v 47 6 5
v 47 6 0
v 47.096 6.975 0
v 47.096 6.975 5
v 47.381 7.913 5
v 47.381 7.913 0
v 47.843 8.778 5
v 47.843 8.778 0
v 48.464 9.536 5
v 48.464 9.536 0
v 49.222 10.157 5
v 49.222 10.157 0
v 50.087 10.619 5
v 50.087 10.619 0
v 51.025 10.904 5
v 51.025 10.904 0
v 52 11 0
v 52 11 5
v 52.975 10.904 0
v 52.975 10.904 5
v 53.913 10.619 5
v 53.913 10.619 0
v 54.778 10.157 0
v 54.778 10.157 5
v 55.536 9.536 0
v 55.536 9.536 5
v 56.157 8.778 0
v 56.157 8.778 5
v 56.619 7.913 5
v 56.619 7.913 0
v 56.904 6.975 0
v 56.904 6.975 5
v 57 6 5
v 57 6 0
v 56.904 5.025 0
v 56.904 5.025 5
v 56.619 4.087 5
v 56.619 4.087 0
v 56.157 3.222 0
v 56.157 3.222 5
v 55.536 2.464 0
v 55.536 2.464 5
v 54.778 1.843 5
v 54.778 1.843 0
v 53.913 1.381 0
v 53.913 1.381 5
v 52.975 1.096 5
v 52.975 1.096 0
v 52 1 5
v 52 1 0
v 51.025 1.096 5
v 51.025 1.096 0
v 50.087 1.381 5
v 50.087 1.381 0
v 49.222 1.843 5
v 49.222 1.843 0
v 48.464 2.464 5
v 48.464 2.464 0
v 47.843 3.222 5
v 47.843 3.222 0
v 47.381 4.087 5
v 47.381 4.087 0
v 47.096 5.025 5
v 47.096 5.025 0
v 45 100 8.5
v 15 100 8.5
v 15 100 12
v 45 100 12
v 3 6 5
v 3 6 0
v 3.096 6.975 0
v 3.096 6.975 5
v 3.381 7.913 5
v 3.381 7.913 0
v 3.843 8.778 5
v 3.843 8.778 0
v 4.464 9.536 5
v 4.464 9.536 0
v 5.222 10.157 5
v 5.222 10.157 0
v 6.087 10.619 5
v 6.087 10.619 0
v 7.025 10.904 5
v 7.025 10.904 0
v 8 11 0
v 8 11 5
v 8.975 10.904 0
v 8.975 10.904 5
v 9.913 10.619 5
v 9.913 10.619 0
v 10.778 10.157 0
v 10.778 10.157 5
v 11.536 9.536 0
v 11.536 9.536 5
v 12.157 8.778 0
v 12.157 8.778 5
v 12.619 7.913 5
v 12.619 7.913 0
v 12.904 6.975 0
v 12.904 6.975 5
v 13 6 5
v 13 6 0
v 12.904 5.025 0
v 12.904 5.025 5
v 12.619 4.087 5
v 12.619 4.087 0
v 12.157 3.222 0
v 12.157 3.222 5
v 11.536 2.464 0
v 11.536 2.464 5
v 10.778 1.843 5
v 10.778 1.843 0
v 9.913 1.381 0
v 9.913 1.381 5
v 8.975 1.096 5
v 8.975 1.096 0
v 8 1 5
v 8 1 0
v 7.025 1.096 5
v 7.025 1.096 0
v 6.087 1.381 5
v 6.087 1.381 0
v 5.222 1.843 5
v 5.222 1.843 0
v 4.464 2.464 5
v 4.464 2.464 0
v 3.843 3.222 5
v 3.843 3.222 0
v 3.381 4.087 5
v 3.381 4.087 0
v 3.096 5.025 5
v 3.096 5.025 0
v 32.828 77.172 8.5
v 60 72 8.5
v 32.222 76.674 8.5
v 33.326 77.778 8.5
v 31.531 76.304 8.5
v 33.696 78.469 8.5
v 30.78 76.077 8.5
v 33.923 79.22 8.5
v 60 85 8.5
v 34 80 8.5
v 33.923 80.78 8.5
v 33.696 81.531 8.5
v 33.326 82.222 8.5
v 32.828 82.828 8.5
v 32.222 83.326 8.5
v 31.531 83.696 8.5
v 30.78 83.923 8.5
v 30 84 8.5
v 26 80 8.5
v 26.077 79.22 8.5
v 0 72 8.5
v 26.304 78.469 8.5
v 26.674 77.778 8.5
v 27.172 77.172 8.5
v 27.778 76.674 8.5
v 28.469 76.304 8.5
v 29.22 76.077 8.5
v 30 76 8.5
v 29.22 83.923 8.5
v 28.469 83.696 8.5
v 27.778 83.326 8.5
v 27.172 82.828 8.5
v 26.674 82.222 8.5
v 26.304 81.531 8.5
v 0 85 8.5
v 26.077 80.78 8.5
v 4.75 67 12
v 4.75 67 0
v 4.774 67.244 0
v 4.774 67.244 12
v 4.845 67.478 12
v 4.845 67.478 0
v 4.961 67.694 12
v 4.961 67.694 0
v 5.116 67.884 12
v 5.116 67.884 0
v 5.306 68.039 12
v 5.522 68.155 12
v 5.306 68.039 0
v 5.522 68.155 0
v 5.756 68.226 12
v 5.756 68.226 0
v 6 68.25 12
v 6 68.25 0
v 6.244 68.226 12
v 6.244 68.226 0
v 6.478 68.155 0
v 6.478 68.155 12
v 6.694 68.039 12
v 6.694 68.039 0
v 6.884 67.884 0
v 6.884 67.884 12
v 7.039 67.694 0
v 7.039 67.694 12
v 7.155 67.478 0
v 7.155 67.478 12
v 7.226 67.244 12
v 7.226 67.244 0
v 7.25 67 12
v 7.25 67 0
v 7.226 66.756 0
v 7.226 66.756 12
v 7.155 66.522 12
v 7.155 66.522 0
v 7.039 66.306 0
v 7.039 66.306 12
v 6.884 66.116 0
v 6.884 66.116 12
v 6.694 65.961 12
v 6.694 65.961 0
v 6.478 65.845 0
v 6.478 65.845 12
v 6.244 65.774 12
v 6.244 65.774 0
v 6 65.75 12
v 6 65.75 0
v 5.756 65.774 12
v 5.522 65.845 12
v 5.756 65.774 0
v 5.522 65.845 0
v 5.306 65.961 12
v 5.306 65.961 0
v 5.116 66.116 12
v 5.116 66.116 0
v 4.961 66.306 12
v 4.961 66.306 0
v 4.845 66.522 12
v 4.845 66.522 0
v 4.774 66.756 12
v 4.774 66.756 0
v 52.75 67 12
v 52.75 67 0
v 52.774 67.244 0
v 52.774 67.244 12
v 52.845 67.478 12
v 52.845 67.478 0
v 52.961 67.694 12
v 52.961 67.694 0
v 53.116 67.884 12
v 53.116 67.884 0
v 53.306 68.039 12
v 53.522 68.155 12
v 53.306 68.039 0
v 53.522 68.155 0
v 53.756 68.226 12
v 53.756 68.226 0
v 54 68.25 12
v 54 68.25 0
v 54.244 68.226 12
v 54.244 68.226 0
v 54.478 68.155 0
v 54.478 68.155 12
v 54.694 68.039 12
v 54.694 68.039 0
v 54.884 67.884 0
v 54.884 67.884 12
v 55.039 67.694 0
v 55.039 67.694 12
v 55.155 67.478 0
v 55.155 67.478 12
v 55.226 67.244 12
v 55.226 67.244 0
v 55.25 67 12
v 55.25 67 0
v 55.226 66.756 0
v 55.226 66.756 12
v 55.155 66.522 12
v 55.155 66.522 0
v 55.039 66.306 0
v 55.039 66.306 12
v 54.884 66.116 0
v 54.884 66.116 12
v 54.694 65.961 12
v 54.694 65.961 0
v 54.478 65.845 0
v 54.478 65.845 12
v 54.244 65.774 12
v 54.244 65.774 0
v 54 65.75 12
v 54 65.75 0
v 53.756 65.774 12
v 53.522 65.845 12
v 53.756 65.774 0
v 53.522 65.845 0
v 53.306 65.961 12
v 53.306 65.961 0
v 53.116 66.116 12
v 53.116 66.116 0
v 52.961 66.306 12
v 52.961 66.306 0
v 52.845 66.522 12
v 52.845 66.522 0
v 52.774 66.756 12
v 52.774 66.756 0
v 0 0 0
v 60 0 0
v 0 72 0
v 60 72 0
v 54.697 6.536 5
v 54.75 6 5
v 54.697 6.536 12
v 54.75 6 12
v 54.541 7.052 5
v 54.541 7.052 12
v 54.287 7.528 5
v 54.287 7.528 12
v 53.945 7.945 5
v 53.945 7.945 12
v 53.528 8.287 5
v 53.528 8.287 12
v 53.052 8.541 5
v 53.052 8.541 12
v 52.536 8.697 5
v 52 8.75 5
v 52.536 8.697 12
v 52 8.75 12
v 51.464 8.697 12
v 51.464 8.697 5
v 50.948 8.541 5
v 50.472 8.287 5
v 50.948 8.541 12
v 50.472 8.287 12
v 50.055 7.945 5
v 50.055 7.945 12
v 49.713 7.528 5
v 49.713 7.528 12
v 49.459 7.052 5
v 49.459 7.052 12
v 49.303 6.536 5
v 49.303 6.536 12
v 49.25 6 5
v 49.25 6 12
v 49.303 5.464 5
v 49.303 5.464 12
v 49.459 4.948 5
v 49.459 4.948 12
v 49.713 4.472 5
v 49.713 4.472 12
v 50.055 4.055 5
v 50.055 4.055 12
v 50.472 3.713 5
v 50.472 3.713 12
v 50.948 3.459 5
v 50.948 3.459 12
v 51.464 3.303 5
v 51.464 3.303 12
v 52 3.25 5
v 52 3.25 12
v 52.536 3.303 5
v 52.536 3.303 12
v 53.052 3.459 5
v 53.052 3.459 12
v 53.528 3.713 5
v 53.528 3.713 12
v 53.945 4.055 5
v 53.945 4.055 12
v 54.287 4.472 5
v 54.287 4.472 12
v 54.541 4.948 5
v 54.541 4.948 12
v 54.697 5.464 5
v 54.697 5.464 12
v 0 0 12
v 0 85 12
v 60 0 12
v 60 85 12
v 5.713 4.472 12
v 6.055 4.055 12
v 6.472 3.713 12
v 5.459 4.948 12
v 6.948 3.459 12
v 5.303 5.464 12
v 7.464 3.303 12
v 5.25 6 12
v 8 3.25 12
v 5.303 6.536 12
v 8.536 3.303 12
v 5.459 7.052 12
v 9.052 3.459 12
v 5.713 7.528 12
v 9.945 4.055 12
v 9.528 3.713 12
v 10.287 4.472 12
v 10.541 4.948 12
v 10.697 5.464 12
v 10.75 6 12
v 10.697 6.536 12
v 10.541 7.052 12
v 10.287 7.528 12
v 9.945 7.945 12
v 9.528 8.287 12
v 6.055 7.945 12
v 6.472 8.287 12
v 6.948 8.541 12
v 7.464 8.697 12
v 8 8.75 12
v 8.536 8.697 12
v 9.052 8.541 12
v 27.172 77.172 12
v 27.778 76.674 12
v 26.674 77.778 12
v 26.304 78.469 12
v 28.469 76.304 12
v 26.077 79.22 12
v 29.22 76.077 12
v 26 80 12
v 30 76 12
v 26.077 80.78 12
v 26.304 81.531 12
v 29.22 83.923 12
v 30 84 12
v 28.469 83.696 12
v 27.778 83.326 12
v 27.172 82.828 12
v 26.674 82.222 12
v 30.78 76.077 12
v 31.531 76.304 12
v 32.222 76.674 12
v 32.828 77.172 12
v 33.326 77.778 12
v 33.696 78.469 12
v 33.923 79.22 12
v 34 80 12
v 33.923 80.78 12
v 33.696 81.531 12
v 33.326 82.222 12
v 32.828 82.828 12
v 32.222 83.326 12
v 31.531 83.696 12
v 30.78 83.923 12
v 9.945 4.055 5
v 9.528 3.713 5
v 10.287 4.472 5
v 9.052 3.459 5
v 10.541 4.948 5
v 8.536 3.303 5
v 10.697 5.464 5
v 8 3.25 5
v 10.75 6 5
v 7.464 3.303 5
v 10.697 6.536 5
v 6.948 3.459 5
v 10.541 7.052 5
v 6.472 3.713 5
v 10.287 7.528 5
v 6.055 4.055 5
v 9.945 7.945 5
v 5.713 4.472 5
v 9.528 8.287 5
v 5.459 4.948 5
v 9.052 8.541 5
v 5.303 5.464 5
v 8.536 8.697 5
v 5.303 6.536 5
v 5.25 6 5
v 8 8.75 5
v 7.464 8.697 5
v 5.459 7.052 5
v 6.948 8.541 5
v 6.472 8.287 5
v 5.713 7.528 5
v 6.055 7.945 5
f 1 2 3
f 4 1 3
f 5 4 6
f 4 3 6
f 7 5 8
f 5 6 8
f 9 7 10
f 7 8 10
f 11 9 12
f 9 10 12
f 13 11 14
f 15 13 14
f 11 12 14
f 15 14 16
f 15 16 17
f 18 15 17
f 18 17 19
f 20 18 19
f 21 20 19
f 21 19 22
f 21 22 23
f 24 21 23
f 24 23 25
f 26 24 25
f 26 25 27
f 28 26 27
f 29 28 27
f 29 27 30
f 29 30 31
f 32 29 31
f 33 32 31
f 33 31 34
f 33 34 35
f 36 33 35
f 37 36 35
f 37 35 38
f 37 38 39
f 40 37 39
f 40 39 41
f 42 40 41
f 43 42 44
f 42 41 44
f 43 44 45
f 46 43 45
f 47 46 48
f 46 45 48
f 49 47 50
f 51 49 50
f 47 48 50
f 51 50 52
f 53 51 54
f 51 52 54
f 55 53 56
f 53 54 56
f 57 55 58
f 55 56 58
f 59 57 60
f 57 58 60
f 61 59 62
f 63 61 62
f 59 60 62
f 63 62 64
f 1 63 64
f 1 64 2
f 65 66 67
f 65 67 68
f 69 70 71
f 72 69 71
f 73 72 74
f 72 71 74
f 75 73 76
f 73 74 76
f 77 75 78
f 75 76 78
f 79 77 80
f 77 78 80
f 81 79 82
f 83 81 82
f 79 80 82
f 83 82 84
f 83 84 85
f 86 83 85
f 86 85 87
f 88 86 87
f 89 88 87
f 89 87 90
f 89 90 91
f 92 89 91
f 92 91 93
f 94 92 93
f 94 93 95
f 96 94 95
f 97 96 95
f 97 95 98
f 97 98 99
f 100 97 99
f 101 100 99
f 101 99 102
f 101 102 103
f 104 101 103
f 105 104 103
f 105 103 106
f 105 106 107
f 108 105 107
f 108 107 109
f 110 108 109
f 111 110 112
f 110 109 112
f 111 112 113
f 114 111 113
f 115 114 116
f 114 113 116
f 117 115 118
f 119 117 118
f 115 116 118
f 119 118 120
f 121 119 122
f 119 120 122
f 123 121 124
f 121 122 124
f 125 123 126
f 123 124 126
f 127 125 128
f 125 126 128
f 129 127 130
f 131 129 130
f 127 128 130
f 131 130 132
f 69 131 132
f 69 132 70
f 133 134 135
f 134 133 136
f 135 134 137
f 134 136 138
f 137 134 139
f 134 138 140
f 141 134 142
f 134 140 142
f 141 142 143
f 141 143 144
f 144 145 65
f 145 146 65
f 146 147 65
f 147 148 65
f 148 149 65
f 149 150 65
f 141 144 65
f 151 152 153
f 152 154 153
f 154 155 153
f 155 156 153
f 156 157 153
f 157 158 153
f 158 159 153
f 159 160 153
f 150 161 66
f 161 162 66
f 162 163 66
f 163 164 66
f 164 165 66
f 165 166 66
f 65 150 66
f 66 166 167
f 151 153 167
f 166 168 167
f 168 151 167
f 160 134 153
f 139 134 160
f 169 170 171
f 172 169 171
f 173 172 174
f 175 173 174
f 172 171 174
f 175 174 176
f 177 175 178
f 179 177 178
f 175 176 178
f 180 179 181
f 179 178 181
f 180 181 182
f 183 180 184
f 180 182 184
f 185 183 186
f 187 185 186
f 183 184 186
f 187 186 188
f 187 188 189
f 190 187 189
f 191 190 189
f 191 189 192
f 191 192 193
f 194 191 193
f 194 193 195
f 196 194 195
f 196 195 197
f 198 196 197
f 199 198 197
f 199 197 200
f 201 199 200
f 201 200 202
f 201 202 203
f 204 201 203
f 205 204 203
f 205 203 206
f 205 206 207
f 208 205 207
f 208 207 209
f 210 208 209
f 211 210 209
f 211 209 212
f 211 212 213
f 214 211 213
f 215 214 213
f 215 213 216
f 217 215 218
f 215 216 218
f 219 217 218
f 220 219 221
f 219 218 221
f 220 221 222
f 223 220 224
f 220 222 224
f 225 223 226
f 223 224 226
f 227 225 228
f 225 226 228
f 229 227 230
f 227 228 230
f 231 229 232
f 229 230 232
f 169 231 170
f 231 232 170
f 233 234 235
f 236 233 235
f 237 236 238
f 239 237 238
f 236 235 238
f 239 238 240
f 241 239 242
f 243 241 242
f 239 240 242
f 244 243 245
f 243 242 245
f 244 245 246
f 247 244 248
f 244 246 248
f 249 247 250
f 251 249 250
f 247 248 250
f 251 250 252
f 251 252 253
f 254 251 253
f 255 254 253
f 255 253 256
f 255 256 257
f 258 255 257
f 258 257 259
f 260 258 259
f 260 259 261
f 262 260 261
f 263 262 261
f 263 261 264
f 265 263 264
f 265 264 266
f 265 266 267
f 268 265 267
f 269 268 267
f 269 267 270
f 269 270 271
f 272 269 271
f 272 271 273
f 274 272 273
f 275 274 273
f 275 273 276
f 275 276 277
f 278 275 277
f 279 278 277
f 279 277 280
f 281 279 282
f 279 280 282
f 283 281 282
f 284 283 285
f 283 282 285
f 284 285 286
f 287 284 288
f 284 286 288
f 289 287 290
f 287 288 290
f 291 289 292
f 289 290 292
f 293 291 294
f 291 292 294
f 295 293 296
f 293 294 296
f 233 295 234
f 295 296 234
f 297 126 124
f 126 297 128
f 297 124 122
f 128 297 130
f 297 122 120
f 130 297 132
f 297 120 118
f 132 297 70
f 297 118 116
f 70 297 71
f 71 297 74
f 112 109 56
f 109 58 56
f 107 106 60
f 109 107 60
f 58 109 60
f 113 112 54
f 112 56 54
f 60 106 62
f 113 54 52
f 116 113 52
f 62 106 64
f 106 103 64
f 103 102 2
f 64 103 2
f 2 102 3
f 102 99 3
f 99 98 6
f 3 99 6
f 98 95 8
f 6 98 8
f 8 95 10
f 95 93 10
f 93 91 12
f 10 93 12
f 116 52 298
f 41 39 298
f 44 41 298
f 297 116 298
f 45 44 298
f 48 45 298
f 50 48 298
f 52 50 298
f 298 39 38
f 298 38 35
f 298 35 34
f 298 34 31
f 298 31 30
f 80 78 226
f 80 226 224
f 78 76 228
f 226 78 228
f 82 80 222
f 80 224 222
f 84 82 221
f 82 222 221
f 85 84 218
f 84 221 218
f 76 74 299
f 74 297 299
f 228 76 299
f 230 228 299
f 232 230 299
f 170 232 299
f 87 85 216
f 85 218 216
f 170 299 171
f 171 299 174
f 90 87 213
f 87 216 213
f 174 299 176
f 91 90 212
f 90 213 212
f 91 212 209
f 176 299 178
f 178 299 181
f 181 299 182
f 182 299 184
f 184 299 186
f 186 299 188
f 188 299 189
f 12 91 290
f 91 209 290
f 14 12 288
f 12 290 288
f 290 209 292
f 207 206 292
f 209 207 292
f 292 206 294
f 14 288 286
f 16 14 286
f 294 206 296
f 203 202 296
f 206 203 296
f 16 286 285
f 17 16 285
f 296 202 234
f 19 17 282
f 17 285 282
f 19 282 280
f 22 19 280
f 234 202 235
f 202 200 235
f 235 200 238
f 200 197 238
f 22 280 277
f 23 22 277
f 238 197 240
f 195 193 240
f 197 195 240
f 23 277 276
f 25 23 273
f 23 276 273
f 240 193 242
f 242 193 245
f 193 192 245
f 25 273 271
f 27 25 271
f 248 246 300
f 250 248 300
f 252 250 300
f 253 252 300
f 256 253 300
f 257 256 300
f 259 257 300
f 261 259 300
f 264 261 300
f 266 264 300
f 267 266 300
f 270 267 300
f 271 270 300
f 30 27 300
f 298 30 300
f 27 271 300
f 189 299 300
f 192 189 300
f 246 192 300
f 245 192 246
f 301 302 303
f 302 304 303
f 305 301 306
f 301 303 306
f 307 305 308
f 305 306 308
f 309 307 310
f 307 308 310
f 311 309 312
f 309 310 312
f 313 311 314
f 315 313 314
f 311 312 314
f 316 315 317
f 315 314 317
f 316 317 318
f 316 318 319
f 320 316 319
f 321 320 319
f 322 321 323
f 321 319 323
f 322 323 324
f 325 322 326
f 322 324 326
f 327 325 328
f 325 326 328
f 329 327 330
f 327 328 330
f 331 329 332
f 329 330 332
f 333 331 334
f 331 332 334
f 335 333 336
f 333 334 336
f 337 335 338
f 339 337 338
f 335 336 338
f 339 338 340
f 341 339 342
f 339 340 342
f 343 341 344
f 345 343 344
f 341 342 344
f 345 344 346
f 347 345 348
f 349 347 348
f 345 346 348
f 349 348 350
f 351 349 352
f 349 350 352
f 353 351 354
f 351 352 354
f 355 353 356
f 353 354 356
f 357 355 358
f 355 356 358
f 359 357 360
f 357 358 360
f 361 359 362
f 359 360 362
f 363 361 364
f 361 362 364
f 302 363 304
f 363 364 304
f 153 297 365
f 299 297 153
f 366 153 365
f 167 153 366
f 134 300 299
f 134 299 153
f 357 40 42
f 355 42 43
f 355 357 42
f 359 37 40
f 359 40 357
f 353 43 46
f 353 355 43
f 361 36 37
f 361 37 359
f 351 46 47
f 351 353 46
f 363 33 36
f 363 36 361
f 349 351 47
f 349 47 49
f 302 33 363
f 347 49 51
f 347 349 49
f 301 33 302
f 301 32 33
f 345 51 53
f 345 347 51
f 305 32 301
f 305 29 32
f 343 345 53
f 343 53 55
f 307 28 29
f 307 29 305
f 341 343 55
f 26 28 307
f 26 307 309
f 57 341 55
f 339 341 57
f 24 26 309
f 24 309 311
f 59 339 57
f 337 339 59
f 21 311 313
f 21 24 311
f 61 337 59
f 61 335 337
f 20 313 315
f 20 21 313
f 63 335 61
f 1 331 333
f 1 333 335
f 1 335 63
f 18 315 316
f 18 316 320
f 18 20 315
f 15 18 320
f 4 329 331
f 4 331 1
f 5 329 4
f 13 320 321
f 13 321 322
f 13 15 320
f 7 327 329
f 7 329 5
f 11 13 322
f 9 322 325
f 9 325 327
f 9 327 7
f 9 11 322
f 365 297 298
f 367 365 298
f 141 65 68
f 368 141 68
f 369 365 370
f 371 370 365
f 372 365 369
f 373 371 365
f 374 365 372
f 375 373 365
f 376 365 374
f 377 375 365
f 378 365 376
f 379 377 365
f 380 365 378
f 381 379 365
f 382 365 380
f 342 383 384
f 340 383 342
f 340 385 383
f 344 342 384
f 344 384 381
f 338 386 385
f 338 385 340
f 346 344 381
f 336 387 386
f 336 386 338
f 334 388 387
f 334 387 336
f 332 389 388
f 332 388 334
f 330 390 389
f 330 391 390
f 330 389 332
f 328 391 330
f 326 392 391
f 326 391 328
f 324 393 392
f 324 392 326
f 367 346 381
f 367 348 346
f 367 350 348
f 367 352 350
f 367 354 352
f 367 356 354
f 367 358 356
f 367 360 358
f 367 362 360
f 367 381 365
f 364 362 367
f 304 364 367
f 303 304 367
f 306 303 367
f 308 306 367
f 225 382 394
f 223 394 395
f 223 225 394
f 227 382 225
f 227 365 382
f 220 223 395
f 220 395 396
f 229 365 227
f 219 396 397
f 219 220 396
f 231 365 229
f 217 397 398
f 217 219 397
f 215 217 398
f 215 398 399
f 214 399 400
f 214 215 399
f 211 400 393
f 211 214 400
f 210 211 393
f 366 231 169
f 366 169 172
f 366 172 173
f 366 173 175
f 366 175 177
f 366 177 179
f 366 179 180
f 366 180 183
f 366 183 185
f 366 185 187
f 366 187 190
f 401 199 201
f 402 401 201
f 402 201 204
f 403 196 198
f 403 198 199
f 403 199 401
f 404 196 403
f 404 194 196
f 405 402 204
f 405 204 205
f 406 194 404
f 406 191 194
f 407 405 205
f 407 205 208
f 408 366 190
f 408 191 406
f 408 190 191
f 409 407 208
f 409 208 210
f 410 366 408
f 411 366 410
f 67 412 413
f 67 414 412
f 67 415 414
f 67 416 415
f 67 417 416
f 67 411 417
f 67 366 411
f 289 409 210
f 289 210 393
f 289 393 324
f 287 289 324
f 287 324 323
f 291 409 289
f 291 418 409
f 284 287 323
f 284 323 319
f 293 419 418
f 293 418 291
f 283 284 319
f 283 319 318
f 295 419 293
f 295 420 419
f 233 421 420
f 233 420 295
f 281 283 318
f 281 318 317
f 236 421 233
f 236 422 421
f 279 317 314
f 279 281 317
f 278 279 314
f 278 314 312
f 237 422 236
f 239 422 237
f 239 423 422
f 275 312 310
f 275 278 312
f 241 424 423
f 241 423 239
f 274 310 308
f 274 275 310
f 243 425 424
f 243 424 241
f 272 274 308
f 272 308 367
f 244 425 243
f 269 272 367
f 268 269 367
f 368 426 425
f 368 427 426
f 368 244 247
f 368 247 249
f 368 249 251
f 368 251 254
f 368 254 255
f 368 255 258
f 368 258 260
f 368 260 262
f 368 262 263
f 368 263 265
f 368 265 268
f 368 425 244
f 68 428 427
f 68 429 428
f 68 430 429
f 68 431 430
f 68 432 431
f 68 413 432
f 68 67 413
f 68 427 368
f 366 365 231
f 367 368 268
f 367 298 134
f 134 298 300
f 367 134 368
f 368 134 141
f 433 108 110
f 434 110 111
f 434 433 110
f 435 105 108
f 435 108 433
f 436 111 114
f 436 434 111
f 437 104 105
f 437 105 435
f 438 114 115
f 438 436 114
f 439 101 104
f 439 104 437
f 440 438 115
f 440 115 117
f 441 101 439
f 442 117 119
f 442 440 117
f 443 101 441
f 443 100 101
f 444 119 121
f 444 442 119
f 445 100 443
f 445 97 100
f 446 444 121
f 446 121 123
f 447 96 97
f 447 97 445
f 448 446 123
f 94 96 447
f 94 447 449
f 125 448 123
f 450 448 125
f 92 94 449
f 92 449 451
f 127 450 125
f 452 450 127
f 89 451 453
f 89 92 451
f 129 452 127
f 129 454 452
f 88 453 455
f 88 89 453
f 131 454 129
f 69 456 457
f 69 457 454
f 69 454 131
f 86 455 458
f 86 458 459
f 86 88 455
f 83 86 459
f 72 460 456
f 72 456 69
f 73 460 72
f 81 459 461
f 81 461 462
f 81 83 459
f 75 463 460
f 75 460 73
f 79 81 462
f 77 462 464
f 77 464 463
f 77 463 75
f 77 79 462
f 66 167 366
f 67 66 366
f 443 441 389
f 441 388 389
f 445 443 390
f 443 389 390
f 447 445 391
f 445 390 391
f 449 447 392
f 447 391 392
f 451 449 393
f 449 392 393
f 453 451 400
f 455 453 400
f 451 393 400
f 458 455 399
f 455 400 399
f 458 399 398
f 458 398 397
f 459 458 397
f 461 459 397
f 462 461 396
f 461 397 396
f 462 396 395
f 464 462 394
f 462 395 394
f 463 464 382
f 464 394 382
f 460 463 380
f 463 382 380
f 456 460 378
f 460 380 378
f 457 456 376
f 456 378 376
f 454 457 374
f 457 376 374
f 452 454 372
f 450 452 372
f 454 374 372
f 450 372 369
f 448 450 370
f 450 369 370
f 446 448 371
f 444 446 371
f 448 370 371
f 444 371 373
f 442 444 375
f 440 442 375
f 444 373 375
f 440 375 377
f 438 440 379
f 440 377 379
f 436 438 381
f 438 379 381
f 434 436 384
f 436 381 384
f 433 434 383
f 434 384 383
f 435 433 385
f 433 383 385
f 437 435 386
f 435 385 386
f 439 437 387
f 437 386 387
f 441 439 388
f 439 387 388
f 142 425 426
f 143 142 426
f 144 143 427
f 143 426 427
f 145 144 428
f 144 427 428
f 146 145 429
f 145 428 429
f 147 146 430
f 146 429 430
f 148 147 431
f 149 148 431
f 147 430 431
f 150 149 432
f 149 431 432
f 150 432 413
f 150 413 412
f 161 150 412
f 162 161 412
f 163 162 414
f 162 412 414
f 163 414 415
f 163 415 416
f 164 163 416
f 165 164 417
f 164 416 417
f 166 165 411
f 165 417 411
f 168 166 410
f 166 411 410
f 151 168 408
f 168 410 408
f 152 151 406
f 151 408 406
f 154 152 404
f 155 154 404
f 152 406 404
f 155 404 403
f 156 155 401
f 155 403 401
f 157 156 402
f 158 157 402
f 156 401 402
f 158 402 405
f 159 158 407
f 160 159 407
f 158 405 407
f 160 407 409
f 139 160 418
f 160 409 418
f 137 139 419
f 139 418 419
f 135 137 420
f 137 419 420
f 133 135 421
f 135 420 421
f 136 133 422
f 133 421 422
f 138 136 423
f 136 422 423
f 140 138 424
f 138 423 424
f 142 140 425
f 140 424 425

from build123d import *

# Parameters (mm, degrees)
ESQUISSE2_W                                        = 60
ESQUISSE2_H                                        = 100
BOSS_EXTRU_1_DEPTH                                 = 12
ESQUISSE3_R                                        = 4
ENL_V_MAT_EXTRU_1_DEPTH                            = 3.5
ESQUISSE5_W                                        = 8.5
ESQUISSE5_H                                        = 28
ENL_V_MAT_EXTRU_2_DEPTH                            = 61
TROU_TARAUD_M31_D                                  = 2.5
TROU_TARAUD_M32_D                                  = 2.5
CHAMBRAGE_POUR_VIS_T_TE_HEXAGONALE_M51_D           = 5.5
CHAMBRAGE_POUR_VIS_T_TE_HEXAGONALE_M51_CBORE_D     = 10
CHAMBRAGE_POUR_VIS_T_TE_HEXAGONALE_M51_CBORE_DEPTH = 5
CHAMBRAGE_POUR_VIS_T_TE_HEXAGONALE_M52_D           = 5.5
CHAMBRAGE_POUR_VIS_T_TE_HEXAGONALE_M52_CBORE_D     = 10
CHAMBRAGE_POUR_VIS_T_TE_HEXAGONALE_M52_CBORE_DEPTH = 5
CHANFREIN1_SIZE                                    = 15


with BuildPart() as part:
    # Esquisse2 → Boss.-Extru.1 (new body)
    with BuildSketch(Plane.XY):
        with Locations((30, 50)):
            Rectangle(ESQUISSE2_W, ESQUISSE2_H)
    extrude(amount=BOSS_EXTRU_1_DEPTH)

    # Esquisse3 → Enlèv. mat.-Extru.1 (cut)
    with BuildSketch(Plane.XY.offset(12)):
        with Locations((30, 80)):
            Circle(ESQUISSE3_R)
    extrude(amount=-ENL_V_MAT_EXTRU_1_DEPTH, mode=Mode.SUBTRACT)

    # Esquisse5 → Enlèv. mat.-Extru.2 (cut, through all)
    with BuildSketch(Plane.ZY):
        with Locations((4.25, 86)):
            Rectangle(ESQUISSE5_W, ESQUISSE5_H)
    extrude(amount=-ENL_V_MAT_EXTRU_2_DEPTH, mode=Mode.SUBTRACT)

    # Trou taraudé M31 (through all)
    with Locations(Plane.XY.offset(12)):
        with Locations((54, 67), (30, 80)):
            Hole(TROU_TARAUD_M31_D / 2)

    # Trou taraudé M32 (through all)
    with Locations(Plane.XY.offset(12)):
        with Locations((6, 67)):
            Hole(TROU_TARAUD_M32_D / 2)

    # Chambrage pour vis à tête hexagonale M51 (through all)
    with Locations(Plane(origin=(0, 0, 0), x_dir=(-1, 0, 0), z_dir=(0, 0, -1))):
        with Locations((-8, 6)):
            CounterBoreHole(CHAMBRAGE_POUR_VIS_T_TE_HEXAGONALE_M51_D / 2, CHAMBRAGE_POUR_VIS_T_TE_HEXAGONALE_M51_CBORE_D / 2, CHAMBRAGE_POUR_VIS_T_TE_HEXAGONALE_M51_CBORE_DEPTH)

    # Chambrage pour vis à tête hexagonale M52 (through all)
    with Locations(Plane(origin=(0, 0, 0), x_dir=(-1, 0, 0), z_dir=(0, 0, -1))):
        with Locations((-52, 6)):
            CounterBoreHole(CHAMBRAGE_POUR_VIS_T_TE_HEXAGONALE_M52_D / 2, CHAMBRAGE_POUR_VIS_T_TE_HEXAGONALE_M52_CBORE_D / 2, CHAMBRAGE_POUR_VIS_T_TE_HEXAGONALE_M52_CBORE_DEPTH)

    # Chanfrein1
    chanfrein1_edges = [part.edges().sort_by_distance(p)[0] for p in [
        (0, 100, 10.25),
        (60, 100, 10.25),
    ]]
    chamfer(chanfrein1_edges, length=CHANFREIN1_SIZE)


solid = part.part
